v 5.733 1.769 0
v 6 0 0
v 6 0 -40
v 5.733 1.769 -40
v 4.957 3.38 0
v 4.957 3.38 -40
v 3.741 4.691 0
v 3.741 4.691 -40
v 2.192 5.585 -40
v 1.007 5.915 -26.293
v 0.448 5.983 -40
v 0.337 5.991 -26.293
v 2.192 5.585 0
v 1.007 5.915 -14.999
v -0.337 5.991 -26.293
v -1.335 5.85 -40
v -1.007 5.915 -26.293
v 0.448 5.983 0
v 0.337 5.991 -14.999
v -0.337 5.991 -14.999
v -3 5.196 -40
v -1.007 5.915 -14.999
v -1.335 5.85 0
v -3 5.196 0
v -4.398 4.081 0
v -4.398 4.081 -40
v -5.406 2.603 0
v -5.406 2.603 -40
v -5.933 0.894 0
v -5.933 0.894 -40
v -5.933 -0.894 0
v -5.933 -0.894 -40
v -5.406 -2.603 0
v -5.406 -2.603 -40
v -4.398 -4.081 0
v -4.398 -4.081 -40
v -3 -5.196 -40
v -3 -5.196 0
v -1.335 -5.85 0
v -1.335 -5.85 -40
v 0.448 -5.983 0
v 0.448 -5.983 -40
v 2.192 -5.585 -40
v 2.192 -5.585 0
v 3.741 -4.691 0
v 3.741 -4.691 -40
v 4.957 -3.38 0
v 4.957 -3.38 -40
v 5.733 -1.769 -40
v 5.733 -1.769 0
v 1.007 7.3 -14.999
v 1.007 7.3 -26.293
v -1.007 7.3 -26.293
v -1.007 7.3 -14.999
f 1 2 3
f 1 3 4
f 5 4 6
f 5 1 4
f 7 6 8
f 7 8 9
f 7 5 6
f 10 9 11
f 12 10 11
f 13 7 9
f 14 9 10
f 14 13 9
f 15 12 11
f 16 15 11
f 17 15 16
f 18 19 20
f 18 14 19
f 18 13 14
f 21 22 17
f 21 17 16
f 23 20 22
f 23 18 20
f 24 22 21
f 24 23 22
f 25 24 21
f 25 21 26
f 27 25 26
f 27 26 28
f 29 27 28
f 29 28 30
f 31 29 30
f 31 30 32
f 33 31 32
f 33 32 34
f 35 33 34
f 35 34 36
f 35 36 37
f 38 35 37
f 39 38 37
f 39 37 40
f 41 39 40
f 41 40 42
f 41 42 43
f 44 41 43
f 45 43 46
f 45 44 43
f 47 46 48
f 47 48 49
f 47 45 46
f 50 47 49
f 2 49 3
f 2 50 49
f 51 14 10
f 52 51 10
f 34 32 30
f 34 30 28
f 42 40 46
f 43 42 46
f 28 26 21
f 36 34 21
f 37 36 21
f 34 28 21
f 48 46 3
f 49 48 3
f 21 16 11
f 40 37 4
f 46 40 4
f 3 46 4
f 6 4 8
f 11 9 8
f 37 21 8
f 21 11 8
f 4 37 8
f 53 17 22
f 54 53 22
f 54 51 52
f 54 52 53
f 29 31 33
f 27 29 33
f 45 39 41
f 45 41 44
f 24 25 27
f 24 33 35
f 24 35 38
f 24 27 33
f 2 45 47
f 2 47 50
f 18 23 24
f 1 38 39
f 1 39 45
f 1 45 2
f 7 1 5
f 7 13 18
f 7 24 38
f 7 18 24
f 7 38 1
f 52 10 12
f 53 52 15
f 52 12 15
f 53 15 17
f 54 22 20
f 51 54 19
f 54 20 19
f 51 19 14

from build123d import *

# Parameters (mm, degrees)
SKETCH1_R           = 6
BOSS_EXTRUDE1_DEPTH = 40
BOSS_EXTRUDE2_DEPTH = 1.3
BOSS_EXTRUDE3_START = -0.085027
BOSS_EXTRUDE3_DEPTH = 0.085027


with BuildPart() as part:
    # Sketch1 → Boss-Extrude1 (new body)
    with BuildSketch(Plane.XY):
        Circle(SKETCH1_R)
    extrude(amount=-BOSS_EXTRUDE1_DEPTH)



with BuildPart() as body_2:
    # Sketch3 → Boss-Extrude2 (new body)
    with BuildSketch(Plane(origin=(0, 6, 0), x_dir=(-1, 0, 0), z_dir=(0, 1, 0))):
        Polygon((0, -14.998657747), (-1.006524795, -14.998657747), (-1.006524795, -26.292665591), (0, -26.292665591), (1.006524795, -26.292665591), (1.006524795, -14.998657747), align=None)
    extrude(amount=BOSS_EXTRUDE2_DEPTH)


with BuildPart() as part_1:
    add(part.part)

    add(body_2.part)  # Boss-Extrude3 merges body 2
    # Sketch3<2> → Boss-Extrude3 (add)
    with BuildSketch(Plane(origin=(0, 6, 0), x_dir=(-1, 0, 0), z_dir=(0, 1, 0)).offset(BOSS_EXTRUDE3_START)):
        Polygon((0, -14.998657747), (-1.006524795, -14.998657747), (-1.006524795, -26.292665591), (0, -26.292665591), (1.006524795, -26.292665591), (1.006524795, -14.998657747), align=None)
    extrude(amount=BOSS_EXTRUDE3_DEPTH)


solid = part_1.part
